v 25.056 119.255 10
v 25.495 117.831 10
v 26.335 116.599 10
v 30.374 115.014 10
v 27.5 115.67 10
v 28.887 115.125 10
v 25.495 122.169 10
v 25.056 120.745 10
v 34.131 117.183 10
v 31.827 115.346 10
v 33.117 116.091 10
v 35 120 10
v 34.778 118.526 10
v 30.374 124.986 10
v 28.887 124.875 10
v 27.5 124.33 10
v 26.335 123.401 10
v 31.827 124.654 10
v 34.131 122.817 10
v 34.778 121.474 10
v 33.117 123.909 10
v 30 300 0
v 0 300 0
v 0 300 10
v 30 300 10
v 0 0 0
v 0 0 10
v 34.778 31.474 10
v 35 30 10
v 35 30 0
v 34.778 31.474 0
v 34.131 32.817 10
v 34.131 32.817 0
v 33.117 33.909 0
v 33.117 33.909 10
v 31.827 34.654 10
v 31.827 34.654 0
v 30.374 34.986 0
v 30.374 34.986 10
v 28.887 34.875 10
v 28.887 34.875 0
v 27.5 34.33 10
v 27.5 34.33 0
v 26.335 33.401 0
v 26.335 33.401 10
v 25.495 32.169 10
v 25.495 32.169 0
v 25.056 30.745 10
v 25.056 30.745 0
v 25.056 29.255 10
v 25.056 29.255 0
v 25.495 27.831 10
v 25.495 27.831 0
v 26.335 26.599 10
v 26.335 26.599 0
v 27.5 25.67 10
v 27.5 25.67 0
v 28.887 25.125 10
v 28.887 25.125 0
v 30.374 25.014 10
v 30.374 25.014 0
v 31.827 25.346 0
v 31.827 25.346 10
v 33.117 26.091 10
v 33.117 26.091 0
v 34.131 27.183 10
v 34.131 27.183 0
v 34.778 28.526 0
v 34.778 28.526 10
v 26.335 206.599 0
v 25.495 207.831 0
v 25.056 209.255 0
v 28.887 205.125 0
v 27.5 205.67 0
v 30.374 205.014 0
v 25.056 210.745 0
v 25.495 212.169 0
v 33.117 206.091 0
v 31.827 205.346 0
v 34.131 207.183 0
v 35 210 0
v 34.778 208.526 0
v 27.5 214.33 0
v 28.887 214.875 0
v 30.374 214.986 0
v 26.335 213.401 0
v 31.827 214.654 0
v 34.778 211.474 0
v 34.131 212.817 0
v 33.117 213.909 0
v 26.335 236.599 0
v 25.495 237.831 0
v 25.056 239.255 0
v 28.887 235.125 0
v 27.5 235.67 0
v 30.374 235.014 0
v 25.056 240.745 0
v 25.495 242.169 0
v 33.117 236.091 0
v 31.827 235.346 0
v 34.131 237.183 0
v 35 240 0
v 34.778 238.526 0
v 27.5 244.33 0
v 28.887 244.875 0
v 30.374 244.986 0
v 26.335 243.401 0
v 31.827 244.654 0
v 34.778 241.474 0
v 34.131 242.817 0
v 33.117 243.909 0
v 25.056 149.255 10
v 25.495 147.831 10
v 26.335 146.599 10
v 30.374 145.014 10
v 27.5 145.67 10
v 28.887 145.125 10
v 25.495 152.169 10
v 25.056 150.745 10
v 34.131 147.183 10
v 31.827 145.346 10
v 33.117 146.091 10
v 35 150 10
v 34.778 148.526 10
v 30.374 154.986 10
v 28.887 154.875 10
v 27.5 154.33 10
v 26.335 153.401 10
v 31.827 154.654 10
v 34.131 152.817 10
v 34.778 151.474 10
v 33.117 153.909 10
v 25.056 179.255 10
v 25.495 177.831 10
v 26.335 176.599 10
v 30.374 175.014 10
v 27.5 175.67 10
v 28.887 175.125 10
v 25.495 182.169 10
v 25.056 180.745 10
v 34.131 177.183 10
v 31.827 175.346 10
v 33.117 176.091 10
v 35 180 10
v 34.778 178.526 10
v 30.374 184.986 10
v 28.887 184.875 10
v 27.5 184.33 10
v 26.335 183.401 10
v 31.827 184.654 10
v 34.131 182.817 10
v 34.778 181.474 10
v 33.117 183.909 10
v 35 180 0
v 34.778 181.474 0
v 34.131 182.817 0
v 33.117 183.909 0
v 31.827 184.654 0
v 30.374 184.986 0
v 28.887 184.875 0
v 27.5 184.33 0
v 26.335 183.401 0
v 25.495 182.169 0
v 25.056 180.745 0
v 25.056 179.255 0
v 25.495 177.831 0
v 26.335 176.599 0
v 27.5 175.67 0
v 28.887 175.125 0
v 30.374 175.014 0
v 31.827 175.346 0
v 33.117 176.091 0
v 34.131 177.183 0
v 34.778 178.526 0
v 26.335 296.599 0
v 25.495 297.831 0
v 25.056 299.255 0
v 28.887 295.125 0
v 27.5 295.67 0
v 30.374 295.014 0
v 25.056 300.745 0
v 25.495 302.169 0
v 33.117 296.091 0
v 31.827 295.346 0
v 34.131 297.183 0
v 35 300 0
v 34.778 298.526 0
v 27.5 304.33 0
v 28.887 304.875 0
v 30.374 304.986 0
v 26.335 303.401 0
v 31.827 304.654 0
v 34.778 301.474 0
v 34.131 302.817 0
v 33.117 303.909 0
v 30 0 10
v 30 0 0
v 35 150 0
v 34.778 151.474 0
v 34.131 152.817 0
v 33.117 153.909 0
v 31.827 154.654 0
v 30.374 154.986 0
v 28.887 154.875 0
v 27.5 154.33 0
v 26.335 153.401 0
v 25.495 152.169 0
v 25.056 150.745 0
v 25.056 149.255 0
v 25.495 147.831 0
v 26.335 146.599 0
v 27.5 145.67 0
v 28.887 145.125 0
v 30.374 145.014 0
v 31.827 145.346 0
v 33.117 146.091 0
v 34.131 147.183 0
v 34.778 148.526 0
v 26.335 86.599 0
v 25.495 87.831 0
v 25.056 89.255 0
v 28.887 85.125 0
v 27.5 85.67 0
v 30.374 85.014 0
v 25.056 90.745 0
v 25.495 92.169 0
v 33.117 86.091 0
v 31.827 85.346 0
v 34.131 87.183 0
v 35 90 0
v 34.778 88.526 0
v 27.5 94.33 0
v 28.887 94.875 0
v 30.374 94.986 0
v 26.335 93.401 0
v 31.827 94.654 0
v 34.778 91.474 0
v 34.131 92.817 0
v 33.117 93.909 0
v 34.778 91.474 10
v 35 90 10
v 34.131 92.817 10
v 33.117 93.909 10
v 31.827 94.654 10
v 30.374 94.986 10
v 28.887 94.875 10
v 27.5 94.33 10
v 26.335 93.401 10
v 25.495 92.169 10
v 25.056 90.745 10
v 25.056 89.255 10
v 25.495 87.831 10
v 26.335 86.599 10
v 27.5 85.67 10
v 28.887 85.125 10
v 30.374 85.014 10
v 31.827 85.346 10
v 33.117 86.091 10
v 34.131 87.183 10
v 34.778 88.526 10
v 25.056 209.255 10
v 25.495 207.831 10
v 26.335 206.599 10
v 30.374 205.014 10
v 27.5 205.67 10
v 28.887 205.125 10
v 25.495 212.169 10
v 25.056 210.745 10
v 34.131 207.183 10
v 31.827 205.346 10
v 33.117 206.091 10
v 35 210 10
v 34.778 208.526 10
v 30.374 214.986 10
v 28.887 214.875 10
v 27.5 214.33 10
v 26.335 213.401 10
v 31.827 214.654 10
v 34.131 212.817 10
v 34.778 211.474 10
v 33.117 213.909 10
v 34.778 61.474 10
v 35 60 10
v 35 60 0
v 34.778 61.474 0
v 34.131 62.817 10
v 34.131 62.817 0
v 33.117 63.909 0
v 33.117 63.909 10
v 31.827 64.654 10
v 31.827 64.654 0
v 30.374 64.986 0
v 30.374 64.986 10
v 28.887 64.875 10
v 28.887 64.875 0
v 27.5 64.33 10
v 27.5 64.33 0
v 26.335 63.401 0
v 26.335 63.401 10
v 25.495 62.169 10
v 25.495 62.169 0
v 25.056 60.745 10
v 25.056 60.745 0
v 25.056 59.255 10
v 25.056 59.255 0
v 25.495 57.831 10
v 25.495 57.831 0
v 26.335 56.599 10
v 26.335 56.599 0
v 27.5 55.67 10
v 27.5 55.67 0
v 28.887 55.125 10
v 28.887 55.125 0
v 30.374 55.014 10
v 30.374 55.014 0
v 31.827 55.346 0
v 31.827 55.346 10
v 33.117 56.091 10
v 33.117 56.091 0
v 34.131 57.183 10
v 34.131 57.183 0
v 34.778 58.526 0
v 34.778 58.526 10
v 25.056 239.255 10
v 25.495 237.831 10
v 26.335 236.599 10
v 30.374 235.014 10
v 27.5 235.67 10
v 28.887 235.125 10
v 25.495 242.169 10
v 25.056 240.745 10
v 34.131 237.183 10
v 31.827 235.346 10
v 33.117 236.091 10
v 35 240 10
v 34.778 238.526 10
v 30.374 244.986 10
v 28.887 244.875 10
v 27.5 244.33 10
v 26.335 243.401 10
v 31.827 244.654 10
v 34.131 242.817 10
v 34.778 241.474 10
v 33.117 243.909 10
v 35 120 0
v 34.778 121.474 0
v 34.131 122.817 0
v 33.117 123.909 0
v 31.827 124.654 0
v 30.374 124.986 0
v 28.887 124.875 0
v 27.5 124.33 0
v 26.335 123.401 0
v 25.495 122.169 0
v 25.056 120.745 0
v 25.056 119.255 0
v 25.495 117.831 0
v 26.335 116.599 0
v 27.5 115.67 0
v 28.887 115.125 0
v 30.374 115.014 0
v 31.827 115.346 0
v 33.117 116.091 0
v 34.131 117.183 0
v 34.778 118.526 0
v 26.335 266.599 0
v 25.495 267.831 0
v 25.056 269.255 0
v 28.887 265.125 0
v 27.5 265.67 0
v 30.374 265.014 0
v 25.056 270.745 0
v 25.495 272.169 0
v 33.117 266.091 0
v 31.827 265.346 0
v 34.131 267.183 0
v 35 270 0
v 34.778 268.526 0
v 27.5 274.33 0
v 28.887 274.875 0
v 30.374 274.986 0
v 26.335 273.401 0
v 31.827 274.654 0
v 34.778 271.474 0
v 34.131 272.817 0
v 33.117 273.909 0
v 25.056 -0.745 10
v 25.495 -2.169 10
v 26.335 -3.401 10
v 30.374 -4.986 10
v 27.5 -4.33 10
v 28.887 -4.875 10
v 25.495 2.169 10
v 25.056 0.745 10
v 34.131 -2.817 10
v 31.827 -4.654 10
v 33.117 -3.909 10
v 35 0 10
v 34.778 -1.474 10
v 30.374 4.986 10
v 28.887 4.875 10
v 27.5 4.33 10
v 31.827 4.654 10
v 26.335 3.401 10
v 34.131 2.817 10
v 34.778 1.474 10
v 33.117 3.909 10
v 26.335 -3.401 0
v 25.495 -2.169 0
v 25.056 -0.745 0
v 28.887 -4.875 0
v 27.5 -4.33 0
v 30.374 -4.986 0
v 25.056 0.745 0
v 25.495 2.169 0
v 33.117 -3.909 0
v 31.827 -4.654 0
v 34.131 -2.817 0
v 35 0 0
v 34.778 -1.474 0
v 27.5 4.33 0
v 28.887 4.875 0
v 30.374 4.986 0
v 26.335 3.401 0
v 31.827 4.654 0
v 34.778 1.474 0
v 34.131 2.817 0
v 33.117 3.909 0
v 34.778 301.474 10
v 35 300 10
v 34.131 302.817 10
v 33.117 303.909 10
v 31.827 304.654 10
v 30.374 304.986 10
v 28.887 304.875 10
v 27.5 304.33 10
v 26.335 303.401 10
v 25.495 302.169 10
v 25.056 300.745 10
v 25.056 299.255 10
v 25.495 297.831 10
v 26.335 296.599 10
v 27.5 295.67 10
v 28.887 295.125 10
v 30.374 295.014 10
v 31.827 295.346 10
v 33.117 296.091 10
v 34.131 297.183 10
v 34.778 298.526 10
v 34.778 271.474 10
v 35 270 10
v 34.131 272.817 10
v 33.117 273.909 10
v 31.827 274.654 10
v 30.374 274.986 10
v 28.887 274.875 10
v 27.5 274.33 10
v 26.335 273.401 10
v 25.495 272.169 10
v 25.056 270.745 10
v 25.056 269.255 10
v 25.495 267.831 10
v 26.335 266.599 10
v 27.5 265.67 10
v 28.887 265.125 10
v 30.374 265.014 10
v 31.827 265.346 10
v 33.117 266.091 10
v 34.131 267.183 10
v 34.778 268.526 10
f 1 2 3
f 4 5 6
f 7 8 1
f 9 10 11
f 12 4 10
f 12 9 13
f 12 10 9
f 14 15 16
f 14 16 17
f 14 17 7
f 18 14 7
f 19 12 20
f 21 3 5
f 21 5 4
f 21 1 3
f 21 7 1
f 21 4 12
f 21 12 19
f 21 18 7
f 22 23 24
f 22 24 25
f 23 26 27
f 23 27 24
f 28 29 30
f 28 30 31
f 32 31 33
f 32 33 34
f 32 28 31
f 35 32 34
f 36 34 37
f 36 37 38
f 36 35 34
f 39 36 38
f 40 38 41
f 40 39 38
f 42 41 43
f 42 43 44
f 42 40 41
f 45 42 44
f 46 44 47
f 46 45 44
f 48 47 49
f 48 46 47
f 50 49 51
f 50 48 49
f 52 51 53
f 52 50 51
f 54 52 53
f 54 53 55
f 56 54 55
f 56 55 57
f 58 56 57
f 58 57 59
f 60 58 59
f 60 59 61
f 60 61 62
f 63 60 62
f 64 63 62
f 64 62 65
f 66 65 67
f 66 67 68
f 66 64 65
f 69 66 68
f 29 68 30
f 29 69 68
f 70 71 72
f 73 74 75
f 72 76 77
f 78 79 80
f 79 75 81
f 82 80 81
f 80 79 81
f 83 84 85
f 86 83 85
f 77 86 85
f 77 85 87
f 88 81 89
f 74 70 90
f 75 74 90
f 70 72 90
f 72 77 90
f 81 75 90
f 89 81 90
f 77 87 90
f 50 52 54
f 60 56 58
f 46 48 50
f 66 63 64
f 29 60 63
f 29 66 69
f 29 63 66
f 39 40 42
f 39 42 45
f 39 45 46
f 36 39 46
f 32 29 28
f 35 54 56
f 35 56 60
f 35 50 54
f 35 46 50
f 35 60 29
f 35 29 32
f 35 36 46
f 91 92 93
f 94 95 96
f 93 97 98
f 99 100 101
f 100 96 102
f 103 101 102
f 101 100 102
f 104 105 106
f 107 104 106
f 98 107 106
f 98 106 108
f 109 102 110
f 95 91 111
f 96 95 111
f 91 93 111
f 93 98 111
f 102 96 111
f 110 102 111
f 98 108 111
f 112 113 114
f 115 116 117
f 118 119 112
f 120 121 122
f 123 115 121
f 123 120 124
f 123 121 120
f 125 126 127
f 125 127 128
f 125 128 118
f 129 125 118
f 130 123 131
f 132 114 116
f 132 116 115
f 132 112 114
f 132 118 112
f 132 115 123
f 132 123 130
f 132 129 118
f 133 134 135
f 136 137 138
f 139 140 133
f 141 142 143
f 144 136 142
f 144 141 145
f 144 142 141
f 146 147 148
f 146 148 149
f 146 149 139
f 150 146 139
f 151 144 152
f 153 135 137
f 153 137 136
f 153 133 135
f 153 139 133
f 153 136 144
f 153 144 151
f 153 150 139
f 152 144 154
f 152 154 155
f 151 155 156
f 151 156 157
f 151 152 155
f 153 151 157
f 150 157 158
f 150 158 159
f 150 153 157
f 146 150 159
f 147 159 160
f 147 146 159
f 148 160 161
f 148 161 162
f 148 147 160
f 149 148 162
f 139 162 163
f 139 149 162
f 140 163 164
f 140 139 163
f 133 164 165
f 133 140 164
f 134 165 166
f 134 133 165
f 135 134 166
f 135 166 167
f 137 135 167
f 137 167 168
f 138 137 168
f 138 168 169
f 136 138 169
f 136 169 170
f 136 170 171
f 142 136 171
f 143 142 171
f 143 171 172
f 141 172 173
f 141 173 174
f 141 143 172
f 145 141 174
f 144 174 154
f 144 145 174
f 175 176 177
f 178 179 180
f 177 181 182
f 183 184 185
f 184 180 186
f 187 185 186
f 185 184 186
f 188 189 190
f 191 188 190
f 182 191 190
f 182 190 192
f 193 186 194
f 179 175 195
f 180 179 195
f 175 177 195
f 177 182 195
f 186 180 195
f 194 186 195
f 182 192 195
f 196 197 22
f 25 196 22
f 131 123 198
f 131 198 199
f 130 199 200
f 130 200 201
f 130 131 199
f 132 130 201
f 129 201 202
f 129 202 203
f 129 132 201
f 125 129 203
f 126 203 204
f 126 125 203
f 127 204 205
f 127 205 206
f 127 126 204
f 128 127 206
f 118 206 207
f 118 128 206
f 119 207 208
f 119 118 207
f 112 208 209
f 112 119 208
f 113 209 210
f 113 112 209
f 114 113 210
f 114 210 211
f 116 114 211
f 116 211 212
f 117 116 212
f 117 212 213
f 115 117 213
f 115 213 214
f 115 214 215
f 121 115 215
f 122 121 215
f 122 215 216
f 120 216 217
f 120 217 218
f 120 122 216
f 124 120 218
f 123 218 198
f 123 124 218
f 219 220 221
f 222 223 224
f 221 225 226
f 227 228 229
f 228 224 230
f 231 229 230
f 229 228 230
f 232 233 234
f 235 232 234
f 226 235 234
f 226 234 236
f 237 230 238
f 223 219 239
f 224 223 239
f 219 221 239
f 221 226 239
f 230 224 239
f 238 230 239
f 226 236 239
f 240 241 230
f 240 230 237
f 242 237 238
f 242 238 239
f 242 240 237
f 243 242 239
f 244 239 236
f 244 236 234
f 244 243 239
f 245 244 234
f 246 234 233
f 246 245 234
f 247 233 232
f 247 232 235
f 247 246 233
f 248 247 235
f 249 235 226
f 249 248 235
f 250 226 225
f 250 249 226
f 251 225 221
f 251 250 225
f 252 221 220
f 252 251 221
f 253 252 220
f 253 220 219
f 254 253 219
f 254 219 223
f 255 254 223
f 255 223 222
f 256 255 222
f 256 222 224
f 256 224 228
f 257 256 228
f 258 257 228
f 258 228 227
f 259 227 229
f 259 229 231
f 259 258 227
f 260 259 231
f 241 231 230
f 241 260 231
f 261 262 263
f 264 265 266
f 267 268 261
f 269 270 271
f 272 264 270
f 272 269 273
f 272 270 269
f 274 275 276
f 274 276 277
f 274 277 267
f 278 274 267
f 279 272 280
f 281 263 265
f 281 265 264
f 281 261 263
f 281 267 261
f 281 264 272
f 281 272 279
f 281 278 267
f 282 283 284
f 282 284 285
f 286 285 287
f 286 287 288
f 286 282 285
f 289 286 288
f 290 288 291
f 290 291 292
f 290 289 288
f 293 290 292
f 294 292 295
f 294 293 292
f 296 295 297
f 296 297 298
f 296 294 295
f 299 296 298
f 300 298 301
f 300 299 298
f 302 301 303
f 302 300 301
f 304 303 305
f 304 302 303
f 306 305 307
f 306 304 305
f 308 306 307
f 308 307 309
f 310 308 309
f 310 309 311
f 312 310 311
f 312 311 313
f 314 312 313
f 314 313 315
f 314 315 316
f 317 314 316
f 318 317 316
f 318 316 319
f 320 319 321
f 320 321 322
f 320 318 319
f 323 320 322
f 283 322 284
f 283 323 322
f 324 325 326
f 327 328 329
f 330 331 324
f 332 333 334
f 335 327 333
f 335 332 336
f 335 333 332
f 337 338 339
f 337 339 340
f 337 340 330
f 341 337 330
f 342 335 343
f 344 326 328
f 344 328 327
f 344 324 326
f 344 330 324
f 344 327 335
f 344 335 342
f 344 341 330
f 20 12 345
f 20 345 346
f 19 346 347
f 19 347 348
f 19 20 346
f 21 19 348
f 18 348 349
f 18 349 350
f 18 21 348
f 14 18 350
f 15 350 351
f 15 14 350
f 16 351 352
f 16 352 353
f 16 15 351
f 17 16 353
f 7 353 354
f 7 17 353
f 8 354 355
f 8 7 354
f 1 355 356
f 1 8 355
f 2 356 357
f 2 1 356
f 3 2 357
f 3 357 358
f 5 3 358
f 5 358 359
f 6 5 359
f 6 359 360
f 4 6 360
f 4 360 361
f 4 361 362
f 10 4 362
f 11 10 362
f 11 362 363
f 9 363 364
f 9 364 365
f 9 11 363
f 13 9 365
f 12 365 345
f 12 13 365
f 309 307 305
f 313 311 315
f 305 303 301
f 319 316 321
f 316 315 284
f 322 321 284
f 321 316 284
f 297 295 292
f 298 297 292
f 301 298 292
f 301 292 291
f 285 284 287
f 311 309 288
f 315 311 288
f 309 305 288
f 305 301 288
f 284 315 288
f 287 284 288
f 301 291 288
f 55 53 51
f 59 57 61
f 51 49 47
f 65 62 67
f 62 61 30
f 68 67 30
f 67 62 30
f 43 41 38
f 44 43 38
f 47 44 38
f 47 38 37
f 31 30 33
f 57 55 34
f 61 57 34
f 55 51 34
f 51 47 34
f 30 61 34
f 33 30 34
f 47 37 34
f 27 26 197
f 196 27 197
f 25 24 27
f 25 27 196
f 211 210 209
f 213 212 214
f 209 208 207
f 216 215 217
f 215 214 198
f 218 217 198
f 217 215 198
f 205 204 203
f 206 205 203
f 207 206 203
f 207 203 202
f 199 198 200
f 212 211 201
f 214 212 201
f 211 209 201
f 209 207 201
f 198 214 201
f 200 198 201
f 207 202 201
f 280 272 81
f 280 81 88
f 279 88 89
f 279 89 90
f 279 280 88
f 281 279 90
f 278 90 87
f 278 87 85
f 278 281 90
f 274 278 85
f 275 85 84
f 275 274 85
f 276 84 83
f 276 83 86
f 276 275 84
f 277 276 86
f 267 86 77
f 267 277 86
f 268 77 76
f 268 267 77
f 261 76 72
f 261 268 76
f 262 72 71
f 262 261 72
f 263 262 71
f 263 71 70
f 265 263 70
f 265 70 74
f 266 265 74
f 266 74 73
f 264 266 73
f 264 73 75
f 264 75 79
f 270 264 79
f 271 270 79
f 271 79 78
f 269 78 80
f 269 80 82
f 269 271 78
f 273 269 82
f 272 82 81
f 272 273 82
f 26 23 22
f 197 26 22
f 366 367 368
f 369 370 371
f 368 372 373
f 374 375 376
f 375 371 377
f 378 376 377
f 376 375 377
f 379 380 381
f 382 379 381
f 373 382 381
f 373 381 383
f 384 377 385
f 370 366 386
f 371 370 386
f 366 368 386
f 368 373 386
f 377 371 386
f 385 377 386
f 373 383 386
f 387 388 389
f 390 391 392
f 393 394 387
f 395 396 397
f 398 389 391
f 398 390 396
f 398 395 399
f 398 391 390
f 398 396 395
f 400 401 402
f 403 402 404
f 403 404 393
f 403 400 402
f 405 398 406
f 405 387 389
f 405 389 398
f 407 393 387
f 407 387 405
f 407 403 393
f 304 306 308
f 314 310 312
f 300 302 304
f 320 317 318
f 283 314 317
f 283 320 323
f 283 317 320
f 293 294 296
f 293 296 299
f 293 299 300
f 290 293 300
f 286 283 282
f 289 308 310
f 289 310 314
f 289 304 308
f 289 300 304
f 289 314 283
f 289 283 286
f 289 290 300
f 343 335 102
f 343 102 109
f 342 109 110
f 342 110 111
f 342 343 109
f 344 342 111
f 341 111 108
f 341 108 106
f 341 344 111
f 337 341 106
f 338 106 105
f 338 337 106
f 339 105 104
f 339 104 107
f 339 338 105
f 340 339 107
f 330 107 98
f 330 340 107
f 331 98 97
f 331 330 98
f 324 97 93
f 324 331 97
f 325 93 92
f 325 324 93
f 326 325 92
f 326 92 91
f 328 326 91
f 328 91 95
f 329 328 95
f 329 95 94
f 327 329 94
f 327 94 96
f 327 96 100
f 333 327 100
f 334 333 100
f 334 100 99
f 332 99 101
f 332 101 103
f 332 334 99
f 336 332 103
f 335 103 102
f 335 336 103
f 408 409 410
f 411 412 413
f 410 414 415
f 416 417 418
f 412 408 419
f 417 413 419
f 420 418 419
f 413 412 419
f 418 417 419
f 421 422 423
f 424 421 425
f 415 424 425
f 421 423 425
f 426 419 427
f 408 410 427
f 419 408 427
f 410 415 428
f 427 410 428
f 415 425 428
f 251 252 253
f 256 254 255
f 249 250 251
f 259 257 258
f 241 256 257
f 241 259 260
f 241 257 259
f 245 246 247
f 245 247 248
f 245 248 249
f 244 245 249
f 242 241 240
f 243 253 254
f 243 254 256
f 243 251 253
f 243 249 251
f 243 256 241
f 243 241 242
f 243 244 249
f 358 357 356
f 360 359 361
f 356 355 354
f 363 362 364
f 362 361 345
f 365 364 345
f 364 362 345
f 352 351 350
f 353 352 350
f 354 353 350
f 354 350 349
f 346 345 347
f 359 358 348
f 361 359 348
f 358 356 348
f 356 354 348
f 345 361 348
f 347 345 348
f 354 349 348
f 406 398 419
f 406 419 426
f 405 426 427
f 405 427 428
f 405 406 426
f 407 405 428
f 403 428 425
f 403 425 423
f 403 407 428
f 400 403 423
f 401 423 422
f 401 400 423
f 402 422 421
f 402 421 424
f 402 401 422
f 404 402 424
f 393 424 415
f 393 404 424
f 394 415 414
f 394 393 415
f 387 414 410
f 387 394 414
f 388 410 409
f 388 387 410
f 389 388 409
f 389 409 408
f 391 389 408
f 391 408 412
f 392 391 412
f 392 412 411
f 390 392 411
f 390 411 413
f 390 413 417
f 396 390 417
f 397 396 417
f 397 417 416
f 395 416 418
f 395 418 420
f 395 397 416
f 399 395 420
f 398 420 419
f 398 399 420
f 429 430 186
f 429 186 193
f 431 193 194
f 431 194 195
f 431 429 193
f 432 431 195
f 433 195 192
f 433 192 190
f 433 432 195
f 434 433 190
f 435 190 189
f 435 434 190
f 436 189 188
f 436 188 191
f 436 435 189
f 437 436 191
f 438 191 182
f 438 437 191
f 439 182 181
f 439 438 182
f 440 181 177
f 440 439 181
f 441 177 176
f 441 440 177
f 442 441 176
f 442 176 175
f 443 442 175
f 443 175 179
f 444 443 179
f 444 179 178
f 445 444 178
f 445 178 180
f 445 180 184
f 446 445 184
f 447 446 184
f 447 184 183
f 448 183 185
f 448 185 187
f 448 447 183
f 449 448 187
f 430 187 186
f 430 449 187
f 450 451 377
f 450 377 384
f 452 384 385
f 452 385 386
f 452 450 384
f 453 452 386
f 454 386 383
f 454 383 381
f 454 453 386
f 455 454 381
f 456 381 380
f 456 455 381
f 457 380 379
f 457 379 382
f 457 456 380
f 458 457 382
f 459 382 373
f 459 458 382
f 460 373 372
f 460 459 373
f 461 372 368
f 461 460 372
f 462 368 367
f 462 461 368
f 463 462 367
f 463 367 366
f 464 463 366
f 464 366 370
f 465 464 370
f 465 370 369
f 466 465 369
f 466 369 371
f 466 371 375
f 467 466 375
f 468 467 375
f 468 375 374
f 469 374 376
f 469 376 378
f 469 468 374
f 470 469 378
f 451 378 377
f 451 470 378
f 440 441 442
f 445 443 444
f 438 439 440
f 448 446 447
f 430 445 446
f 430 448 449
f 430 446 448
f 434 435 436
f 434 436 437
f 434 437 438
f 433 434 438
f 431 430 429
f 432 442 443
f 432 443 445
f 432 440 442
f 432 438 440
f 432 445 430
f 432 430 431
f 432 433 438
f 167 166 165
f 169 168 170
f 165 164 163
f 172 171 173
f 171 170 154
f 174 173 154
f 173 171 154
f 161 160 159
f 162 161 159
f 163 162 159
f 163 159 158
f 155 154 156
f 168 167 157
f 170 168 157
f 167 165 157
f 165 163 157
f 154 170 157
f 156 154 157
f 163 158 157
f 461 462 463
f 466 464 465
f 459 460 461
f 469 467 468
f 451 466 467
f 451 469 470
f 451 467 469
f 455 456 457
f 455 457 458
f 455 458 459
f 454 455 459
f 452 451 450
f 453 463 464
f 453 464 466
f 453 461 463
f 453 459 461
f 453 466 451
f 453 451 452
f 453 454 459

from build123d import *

# Parameters (mm, degrees)
SKETCH2_W              = 30
SKETCH2_H              = 300
BOSS_EXTRUDE1_DEPTH    = 10
SKETCH3_R              = 5
BOSS_EXTRUDE2_DEPTH    = 10
BOSS_EXTRUDE2_2_DEPTH  = 10
BOSS_EXTRUDE2_3_DEPTH  = 10
BOSS_EXTRUDE2_4_DEPTH  = 10
BOSS_EXTRUDE2_5_DEPTH  = 10
BOSS_EXTRUDE2_6_DEPTH  = 10
BOSS_EXTRUDE2_7_DEPTH  = 10
BOSS_EXTRUDE2_8_DEPTH  = 10
BOSS_EXTRUDE2_9_DEPTH  = 10
BOSS_EXTRUDE2_10_DEPTH = 10
BOSS_EXTRUDE2_11_DEPTH = 10


with BuildPart() as part:
    # Sketch2 → Boss-Extrude1 (new body)
    with BuildSketch(Plane.XY):
        with Locations((15, 150)):
            Rectangle(SKETCH2_W, SKETCH2_H)
    extrude(amount=BOSS_EXTRUDE1_DEPTH)


with BuildPart() as body_2:
    # Sketch3 → Boss-Extrude2 (new body)
    with BuildSketch(Plane.XY.offset(10)):
        with Locations((30, 300)):
            Circle(SKETCH3_R)
    extrude(amount=-BOSS_EXTRUDE2_DEPTH)


with BuildPart() as body_3:
    # Sketch3 → Boss-Extrude2 2 (new body)
    with BuildSketch(Plane.XY.offset(10)):
        with Locations((30, 270)):
            Circle(SKETCH3_R)
    extrude(amount=-BOSS_EXTRUDE2_2_DEPTH)


with BuildPart() as body_4:
    # Sketch3 → Boss-Extrude2 3 (new body)
    with BuildSketch(Plane.XY.offset(10)):
        with Locations((30, 240)):
            Circle(SKETCH3_R)
    extrude(amount=-BOSS_EXTRUDE2_3_DEPTH)


with BuildPart() as body_5:
    # Sketch3 → Boss-Extrude2 4 (new body)
    with BuildSketch(Plane.XY.offset(10)):
        with Locations((30, 210)):
            Circle(SKETCH3_R)
    extrude(amount=-BOSS_EXTRUDE2_4_DEPTH)


with BuildPart() as body_6:
    # Sketch3 → Boss-Extrude2 5 (new body)
    with BuildSketch(Plane.XY.offset(10)):
        with Locations((30, 180)):
            Circle(SKETCH3_R)
    extrude(amount=-BOSS_EXTRUDE2_5_DEPTH)


with BuildPart() as body_7:
    # Sketch3 → Boss-Extrude2 6 (new body)
    with BuildSketch(Plane.XY.offset(10)):
        with Locations((30, 150)):
            Circle(SKETCH3_R)
    extrude(amount=-BOSS_EXTRUDE2_6_DEPTH)


with BuildPart() as body_8:
    # Sketch3 → Boss-Extrude2 7 (new body)
    with BuildSketch(Plane.XY.offset(10)):
        with Locations((30, 120)):
            Circle(SKETCH3_R)
    extrude(amount=-BOSS_EXTRUDE2_7_DEPTH)


with BuildPart() as body_9:
    # Sketch3 → Boss-Extrude2 8 (new body)
    with BuildSketch(Plane.XY.offset(10)):
        with Locations((30, 90)):
            Circle(SKETCH3_R)
    extrude(amount=-BOSS_EXTRUDE2_8_DEPTH)


with BuildPart() as body_10:
    # Sketch3 → Boss-Extrude2 9 (new body)
    with BuildSketch(Plane.XY.offset(10)):
        with Locations((30, 60)):
            Circle(SKETCH3_R)
    extrude(amount=-BOSS_EXTRUDE2_9_DEPTH)


with BuildPart() as body_11:
    # Sketch3 → Boss-Extrude2 10 (new body)
    with BuildSketch(Plane.XY.offset(10)):
        with Locations((30, 30)):
            Circle(SKETCH3_R)
    extrude(amount=-BOSS_EXTRUDE2_10_DEPTH)


with BuildPart() as body_12:
    # Sketch3 → Boss-Extrude2 11 (new body)
    with BuildSketch(Plane.XY.offset(10)):
        with Locations((30, 0)):
            Circle(SKETCH3_R)
    extrude(amount=-BOSS_EXTRUDE2_11_DEPTH)


solid = Compound([part.part, body_2.part, body_3.part, body_4.part, body_5.part, body_6.part, body_7.part, body_8.part, body_9.part, body_10.part, body_11.part, body_12.part])
